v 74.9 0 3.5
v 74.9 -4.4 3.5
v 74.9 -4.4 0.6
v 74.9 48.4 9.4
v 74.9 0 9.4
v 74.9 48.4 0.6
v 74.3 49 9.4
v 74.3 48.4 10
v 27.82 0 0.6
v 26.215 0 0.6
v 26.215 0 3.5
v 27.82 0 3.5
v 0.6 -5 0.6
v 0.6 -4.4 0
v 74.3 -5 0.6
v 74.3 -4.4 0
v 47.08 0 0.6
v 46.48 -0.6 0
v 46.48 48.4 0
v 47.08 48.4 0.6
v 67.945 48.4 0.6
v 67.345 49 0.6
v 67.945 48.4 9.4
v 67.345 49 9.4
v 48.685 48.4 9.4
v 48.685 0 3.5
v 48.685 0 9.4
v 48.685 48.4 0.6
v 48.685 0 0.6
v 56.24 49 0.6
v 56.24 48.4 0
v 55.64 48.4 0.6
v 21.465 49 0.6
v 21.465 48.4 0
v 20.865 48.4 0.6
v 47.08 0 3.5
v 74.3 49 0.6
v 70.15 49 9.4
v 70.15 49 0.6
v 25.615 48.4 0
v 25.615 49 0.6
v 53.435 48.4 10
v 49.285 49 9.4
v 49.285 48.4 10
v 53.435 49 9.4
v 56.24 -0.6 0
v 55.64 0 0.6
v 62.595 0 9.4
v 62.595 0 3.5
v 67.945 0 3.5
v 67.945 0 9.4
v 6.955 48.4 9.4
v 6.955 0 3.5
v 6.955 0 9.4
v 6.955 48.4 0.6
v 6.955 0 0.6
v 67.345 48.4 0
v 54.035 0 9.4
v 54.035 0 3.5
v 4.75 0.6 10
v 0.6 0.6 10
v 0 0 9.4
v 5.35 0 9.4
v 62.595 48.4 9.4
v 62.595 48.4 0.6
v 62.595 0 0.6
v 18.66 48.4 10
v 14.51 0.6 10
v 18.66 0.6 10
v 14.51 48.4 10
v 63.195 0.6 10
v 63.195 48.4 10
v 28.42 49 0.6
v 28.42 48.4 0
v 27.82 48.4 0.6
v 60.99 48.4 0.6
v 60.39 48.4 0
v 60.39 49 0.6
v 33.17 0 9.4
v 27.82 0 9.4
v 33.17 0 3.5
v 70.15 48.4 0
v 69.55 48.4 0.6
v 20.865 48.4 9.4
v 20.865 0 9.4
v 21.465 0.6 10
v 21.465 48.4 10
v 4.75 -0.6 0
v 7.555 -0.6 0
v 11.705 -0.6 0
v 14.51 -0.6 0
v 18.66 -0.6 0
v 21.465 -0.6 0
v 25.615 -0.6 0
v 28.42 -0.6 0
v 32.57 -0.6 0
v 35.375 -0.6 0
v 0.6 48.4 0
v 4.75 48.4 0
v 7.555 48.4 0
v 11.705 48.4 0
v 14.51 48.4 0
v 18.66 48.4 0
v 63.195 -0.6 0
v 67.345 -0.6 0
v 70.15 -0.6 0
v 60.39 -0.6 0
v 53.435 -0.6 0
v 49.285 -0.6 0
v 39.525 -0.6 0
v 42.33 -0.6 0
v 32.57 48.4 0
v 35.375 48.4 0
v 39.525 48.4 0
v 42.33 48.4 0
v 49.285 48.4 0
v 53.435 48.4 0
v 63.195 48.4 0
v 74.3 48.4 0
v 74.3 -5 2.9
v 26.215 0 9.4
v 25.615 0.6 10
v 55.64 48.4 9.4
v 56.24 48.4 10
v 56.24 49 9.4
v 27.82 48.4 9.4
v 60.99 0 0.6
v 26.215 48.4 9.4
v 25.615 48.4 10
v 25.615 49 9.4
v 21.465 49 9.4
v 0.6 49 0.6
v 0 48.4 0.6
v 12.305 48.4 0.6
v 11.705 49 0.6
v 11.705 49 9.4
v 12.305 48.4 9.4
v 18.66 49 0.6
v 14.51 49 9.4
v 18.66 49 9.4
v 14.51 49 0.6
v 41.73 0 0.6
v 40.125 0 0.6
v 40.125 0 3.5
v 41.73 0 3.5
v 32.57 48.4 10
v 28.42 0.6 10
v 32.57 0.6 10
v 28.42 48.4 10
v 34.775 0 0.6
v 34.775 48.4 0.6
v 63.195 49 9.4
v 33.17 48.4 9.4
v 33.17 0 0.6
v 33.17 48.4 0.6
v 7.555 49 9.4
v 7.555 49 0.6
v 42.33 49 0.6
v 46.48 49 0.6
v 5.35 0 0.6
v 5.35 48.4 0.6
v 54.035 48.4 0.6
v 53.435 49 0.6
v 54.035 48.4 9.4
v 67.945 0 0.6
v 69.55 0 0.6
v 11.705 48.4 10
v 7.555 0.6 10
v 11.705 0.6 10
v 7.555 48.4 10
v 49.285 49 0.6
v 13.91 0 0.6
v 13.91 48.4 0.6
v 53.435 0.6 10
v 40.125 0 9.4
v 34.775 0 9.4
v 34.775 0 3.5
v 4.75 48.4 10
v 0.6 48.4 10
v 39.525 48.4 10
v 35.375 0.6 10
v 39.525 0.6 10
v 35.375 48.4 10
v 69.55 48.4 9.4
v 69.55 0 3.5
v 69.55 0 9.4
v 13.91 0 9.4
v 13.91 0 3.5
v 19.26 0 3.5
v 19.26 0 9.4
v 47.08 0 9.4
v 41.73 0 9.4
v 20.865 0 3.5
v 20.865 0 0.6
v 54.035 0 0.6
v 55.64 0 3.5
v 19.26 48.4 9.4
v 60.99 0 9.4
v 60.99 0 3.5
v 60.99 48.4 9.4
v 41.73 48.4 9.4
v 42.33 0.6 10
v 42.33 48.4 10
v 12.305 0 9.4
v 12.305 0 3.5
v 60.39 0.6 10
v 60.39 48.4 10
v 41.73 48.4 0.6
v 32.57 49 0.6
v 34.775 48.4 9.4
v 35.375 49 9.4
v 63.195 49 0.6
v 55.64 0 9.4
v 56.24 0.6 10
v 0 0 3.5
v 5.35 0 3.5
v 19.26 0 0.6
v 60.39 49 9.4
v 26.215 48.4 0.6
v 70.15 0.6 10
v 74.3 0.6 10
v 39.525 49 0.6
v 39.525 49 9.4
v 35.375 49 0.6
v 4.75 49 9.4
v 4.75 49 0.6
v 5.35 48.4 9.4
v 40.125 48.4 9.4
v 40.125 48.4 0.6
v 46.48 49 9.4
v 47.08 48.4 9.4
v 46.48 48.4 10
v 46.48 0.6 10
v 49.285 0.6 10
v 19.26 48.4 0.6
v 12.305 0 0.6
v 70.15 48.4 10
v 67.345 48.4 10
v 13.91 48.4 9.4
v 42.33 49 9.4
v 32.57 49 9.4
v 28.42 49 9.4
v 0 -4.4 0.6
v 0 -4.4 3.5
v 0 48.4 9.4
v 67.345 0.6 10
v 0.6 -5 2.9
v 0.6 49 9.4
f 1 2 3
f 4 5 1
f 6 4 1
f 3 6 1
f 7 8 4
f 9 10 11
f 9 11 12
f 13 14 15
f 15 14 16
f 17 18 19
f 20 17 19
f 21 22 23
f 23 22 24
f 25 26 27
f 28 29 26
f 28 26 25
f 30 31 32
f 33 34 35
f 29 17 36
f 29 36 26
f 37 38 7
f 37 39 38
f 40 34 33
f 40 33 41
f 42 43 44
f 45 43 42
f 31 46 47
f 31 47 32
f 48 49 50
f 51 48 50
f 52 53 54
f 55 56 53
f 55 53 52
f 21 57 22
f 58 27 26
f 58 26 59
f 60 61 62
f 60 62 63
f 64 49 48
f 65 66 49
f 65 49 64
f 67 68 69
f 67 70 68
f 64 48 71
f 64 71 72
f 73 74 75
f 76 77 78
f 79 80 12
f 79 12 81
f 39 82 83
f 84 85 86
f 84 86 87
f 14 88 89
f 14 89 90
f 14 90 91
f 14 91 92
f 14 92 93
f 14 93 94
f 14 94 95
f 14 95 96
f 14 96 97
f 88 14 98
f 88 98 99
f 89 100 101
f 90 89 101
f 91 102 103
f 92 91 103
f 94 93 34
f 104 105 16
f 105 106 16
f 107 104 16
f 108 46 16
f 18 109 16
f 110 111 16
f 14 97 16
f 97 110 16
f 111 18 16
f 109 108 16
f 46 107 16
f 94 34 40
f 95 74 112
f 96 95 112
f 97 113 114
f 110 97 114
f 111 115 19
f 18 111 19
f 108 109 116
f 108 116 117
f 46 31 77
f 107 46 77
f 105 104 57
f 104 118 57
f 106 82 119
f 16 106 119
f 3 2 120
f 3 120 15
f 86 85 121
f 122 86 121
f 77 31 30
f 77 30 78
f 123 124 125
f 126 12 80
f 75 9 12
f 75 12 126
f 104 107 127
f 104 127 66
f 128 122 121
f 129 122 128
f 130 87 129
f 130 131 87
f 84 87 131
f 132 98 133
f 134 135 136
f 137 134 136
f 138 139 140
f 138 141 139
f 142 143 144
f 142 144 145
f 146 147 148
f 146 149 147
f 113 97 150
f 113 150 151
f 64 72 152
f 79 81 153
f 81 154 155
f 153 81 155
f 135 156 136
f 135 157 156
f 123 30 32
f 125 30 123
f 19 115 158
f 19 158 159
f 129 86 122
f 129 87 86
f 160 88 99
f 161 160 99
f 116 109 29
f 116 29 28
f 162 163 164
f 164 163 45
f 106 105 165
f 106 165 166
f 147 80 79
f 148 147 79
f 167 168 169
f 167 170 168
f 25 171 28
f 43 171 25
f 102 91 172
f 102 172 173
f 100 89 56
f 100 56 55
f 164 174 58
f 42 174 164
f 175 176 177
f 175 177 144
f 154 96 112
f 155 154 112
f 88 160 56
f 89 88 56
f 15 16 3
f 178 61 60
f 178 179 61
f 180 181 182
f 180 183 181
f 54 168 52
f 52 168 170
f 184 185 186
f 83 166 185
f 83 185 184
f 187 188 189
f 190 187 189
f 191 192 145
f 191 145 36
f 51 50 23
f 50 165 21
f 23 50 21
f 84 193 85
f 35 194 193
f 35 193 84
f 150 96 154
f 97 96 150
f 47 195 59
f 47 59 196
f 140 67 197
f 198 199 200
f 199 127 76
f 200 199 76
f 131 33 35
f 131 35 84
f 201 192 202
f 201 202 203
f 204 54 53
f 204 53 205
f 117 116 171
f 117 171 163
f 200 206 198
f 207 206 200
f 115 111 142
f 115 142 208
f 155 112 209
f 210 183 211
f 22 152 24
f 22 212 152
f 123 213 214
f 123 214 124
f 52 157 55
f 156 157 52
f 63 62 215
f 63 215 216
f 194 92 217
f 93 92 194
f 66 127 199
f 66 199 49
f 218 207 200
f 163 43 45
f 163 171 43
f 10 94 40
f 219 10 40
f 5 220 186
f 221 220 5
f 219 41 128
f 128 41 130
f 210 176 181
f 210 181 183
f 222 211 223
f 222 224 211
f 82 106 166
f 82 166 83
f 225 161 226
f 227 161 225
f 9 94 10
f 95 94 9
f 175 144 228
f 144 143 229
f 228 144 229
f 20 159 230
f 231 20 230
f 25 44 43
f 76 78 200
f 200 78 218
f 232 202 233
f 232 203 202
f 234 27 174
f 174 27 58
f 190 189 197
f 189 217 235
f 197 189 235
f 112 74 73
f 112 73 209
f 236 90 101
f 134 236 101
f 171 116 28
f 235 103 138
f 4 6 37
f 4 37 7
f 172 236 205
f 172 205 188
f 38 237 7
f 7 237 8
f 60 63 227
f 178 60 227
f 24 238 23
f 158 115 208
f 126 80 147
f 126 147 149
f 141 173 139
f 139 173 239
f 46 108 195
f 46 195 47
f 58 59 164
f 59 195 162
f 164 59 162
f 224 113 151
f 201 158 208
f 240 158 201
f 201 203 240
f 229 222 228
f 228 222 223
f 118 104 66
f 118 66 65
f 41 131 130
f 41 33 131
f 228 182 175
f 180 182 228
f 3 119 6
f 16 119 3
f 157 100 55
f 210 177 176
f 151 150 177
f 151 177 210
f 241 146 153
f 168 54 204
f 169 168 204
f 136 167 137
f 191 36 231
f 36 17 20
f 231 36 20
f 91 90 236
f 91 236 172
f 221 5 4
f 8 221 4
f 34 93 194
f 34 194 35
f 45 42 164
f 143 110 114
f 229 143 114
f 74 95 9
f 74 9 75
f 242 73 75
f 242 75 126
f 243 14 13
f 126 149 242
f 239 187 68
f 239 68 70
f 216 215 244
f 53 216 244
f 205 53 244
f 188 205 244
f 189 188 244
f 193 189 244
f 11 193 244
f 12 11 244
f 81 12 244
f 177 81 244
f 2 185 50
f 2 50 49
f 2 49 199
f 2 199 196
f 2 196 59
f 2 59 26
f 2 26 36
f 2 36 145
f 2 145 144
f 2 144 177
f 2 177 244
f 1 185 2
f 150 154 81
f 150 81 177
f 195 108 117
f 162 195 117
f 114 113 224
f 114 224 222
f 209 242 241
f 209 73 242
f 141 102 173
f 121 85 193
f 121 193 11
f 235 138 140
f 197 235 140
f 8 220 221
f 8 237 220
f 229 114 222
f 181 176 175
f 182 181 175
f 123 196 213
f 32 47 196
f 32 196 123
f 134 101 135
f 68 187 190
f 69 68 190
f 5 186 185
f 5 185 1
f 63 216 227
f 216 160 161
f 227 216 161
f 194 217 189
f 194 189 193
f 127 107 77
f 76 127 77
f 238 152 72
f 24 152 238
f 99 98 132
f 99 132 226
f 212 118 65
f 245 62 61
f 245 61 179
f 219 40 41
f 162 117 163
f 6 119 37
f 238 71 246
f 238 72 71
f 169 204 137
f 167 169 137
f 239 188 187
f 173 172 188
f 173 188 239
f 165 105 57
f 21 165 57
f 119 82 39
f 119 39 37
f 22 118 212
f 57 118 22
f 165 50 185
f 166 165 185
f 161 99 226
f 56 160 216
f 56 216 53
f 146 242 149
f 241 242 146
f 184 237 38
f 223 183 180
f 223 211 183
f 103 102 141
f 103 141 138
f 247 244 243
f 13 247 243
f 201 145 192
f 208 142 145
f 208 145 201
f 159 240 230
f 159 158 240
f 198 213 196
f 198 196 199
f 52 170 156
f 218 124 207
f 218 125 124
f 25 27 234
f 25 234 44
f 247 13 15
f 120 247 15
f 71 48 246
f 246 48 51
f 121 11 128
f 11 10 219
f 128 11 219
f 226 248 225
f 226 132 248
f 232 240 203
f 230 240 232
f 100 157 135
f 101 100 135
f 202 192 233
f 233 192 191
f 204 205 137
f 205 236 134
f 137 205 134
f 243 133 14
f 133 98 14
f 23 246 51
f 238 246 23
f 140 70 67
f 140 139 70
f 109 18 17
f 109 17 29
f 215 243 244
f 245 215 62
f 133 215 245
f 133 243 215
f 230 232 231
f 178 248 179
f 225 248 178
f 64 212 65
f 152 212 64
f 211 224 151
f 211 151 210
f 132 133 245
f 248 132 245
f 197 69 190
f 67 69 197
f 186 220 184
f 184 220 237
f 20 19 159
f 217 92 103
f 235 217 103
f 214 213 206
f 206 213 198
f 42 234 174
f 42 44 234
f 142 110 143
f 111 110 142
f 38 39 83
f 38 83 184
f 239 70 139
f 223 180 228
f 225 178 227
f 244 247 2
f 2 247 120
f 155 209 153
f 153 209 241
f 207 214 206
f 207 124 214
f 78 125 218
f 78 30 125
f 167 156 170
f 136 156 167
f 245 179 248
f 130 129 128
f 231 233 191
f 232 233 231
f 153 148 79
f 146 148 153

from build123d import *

# Parameters (mm, degrees)
SKETCH015_W             = 74.9
SKETCH015_H             = 3.5
PAD002_DEPTH            = 5
SKETCH017_W             = 5.35
SKETCH017_H             = 49
PAD003_DEPTH            = 10
LINEARPATTERN004_COUNT  = 11
LINEARPATTERN004_PITCH  = 6.955
CHAMFER_SIZE            = 0.6
BODY002_PLACEMENT_ANGLE = 90


with BuildPart() as part:
    # Sketch015 → Pad002 (new body)
    with BuildSketch(Plane.XY):
        with Locations((37.45, -1.75)):
            Rectangle(SKETCH015_W, SKETCH015_H)
    extrude(amount=-PAD002_DEPTH)

    # Sketch017 → Pad003 (join)
    with BuildSketch(Plane.XZ):
        with Locations((2.675, 24.5)):
            Rectangle(SKETCH017_W, SKETCH017_H)
    pad003 = extrude(amount=PAD003_DEPTH)

    # LinearPattern004: Pad003 ×11
    with Locations(*[(i * LINEARPATTERN004_PITCH, 0, 0) for i in range(1, LINEARPATTERN004_COUNT)]):
        add(pad003)

    # Chamfer
    chamfer_edges = [part.edges().sort_by_distance(p)[0] for p in [
        (2.675, -10, 0),
        (5.35, -10, 24.5),
        (2.675, -10, 49),
        (0, -10, 24.5),
        (9.63, -10, 0),
        (12.305, -10, 24.5),
        (9.63, -10, 49),
        (6.955, -10, 24.5),
        (16.585, -10, 0),
        (19.26, -10, 24.5),
        (16.585, -10, 49),
        (13.91, -10, 24.5),
        (23.54, -10, 0),
        (26.215, -10, 24.5),
        (23.54, -10, 49),
        (20.865, -10, 24.5),
        (30.495, -10, 0),
        (33.17, -10, 24.5),
        (30.495, -10, 49),
        (27.82, -10, 24.5),
        (37.45, -10, 0),
        (40.125, -10, 24.5),
        (37.45, -10, 49),
        (34.775, -10, 24.5),
        (44.405, -10, 0),
        (47.08, -10, 24.5),
        (44.405, -10, 49),
        (41.73, -10, 24.5),
        (51.36, -10, 0),
        (54.035, -10, 24.5),
        (51.36, -10, 49),
        (48.685, -10, 24.5),
        (58.315, -10, 0),
        (60.99, -10, 24.5),
        (58.315, -10, 49),
        (55.64, -10, 24.5),
        (65.27, -10, 0),
        (67.945, -10, 24.5),
        (65.27, -10, 49),
        (62.595, -10, 24.5),
        (72.225, -10, 0),
        (74.9, -10, 24.5),
        (72.225, -10, 49),
        (69.55, -10, 24.5),
        (0, 0, 22),
        (2.675, 0, 49),
        (5.35, 0, 24.5),
        (6.1525, 0, 0),
        (6.955, 0, 24.5),
        (9.63, 0, 49),
        (12.305, 0, 24.5),
        (13.1075, 0, 0),
        (13.91, 0, 24.5),
        (16.585, 0, 49),
        (19.26, 0, 24.5),
        (20.0625, 0, 0),
        (20.865, 0, 24.5),
        (23.54, 0, 49),
        (26.215, 0, 24.5),
        (27.0175, 0, 0),
        (27.82, 0, 24.5),
        (30.495, 0, 49),
        (33.17, 0, 24.5),
        (33.9725, 0, 0),
        (34.775, 0, 24.5),
        (37.45, 0, 49),
        (40.125, 0, 24.5),
        (40.9275, 0, 0),
        (41.73, 0, 24.5),
        (44.405, 0, 49),
        (47.08, 0, 24.5),
        (47.8825, 0, 0),
        (48.685, 0, 24.5),
        (51.36, 0, 49),
        (54.035, 0, 24.5),
        (54.8375, 0, 0),
        (55.64, 0, 24.5),
        (58.315, 0, 49),
        (60.99, 0, 24.5),
        (61.7925, 0, 0),
        (62.595, 0, 24.5),
        (65.27, 0, 49),
        (67.945, 0, 24.5),
        (68.7475, 0, 0),
        (69.55, 0, 24.5),
        (72.225, 0, 49),
        (74.9, 0, 22),
        (37.45, 0, -5),
        (5.35, -5, 49),
        (0, -5, 49),
        (12.305, -5, 49),
        (6.955, -5, 49),
        (19.26, -5, 49),
        (13.91, -5, 49),
        (26.215, -5, 49),
        (20.865, -5, 49),
        (33.17, -5, 49),
        (27.82, -5, 49),
        (40.125, -5, 49),
        (34.775, -5, 49),
        (47.08, -5, 49),
        (41.73, -5, 49),
        (54.035, -5, 49),
        (48.685, -5, 49),
        (60.99, -5, 49),
        (55.64, -5, 49),
        (67.945, -5, 49),
        (62.595, -5, 49),
        (74.9, -5, 49),
        (69.55, -5, 49),
        (74.9, -1.75, -5),
        (37.45, -3.5, -5),
        (0, -1.75, -5),
    ]]
    chamfer(chamfer_edges, length=CHAMFER_SIZE)


with BuildPart() as part_1:
    # Body002 placement: moved
    add(part.part.rotate(Axis((0, 0, 0), (-1, 0, 0)), BODY002_PLACEMENT_ANGLE))


solid = part_1.part
